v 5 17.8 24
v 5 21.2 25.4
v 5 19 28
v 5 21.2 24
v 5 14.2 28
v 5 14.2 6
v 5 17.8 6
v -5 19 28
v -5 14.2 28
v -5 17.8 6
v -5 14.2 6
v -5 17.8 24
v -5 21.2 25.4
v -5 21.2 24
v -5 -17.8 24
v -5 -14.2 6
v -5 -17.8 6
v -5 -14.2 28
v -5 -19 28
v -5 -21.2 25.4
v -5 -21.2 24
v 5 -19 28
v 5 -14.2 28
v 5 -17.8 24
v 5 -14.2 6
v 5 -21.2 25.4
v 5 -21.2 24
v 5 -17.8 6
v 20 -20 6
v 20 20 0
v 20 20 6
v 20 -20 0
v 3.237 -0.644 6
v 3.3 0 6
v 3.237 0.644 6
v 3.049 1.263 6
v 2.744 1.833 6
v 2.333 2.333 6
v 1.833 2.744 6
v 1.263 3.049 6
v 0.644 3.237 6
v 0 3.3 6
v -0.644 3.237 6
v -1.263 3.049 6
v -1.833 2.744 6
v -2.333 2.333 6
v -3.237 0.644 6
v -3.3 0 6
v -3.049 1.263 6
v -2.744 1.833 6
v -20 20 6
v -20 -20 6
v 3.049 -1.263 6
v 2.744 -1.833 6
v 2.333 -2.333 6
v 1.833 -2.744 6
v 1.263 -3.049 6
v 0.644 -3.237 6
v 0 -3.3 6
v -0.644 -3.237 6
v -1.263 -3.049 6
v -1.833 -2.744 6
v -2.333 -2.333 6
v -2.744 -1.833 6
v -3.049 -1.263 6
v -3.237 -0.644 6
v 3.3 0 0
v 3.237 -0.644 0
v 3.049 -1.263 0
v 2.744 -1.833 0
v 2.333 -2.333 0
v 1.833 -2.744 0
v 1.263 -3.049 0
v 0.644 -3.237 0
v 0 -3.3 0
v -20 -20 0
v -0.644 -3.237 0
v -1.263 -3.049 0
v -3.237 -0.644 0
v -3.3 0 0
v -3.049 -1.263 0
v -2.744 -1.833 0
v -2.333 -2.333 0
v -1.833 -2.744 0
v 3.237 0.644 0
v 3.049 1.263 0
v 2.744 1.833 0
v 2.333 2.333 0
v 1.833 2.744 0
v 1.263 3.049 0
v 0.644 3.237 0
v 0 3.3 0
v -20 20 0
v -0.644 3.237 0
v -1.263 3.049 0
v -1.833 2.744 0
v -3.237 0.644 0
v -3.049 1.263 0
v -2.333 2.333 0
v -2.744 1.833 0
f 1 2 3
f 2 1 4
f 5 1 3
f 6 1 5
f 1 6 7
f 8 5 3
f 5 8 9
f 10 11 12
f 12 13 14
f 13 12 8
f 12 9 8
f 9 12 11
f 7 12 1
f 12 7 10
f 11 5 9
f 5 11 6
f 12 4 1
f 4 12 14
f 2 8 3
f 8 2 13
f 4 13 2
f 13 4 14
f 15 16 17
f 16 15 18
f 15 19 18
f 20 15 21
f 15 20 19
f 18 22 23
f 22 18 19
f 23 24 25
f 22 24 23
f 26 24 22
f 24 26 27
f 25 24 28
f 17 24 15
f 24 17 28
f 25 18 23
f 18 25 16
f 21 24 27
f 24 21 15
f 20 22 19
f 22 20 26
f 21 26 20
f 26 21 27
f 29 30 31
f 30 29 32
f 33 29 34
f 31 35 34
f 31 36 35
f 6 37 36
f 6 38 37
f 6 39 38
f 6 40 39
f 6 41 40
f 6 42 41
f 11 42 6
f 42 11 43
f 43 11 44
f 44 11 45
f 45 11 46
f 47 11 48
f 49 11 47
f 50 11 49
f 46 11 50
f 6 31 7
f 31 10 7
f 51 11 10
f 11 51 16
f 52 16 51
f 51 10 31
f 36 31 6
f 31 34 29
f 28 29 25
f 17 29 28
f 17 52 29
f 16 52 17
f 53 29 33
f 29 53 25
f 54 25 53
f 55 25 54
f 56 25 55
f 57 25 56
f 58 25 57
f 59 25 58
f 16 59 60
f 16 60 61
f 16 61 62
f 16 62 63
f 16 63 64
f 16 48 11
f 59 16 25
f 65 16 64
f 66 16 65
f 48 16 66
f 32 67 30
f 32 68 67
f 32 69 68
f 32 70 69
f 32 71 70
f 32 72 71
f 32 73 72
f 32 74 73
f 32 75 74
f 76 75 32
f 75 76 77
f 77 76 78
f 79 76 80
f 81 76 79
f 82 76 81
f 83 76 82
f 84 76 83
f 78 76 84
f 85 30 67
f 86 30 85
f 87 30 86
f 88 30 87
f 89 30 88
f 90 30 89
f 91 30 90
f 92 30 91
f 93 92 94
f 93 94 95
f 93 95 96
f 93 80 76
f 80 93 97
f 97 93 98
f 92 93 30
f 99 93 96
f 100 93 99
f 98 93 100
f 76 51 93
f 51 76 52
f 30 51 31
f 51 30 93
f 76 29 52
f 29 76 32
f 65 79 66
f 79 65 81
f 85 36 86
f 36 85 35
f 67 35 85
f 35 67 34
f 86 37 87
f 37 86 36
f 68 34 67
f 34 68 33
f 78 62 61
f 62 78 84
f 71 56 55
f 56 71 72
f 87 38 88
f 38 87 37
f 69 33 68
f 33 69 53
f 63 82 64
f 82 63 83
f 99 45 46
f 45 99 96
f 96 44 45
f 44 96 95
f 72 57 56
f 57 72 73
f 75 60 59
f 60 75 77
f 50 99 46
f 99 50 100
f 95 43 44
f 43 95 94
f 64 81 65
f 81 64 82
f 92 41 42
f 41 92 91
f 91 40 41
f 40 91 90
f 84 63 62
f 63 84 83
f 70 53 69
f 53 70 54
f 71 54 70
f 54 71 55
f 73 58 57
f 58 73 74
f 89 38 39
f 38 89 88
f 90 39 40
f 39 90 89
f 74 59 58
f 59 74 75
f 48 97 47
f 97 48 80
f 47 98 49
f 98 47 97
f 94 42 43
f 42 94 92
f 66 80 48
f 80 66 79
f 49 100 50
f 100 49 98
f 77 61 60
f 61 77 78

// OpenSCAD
$fn = 32;

// ----------------------------------------------------------------------
// Snap-fit latch: 2 arms, 22 mm tall, 3.6 mm undercut hooks
// ----------------------------------------------------------------------

// --- parameters (mm) ---
base_d = 40;              // base plate depth
base_h = 6;               // base plate thickness
span = 32;                // distance between opposite arms
arm_t = 3.6;              // arm thickness
arm_d = 10;               // arm width
height = 22;              // free arm length
head_len = 3.6;           // hook reach
head_h = 4;               // hook height
lead = 1.4;               // lead-in ramp thickness
bore_d = 6.6;             // base fixing bore
top_z = 28;               // height of the arm tips above the base

arms = 2;

difference() {
  union() {
    /* base plate, centred on the arm ring */
    translate([-20, -20, 0]) cube([base_d, base_d, base_h]);
    for (a = [0 : 360 / arms : 359]) rotate([0, 0, a]) {
    /* arm, sunk 0.5 mm into the base */
    translate([-arm_d / 2, span / 2 - arm_t / 2, base_h - 0.5]) cube([arm_d, arm_t, height + 0.5]);
    /* hook: a convex hull of a tall inner block and a thin outer lip
       gives a flat undercut below and a lead-in ramp on top */
    hull() {
      translate([-arm_d / 2, span / 2 + arm_t / 2 - 0.6, top_z - head_h]) cube([arm_d, lead + 0.4, head_h]);
      translate([-arm_d / 2, span / 2 + arm_t / 2 - 0.2, top_z - head_h]) cube([arm_d, head_len, lead]);
    }
    }
  }
  translate([0, 0, -2.5]) cylinder(h = base_h + 5, d = bore_d);
}
